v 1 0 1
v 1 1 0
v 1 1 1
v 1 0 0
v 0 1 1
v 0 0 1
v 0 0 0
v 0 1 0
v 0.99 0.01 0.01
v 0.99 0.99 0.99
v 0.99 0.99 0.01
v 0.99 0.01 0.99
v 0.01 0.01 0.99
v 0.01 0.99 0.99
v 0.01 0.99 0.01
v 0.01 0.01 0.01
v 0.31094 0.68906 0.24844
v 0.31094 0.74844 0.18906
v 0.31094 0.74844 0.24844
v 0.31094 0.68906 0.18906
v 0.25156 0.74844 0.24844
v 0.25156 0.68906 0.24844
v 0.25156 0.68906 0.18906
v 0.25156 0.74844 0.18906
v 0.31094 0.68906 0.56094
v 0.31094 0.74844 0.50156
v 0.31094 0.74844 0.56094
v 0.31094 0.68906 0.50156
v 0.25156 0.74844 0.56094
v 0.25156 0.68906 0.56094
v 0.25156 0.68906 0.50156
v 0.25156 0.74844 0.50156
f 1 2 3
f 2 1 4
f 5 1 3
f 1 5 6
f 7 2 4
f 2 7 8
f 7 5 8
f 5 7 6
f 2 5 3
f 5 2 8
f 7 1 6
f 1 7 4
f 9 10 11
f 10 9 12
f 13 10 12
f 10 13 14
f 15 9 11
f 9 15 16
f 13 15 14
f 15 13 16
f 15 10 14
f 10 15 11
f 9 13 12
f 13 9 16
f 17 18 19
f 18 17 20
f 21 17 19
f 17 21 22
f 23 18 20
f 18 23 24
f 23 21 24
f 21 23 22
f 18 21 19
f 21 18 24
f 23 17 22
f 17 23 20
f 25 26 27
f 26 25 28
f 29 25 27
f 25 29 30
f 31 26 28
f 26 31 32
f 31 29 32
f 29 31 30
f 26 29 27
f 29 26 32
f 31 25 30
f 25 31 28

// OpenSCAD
translate([0.28125, 0.71875, 0.21875]) color([0.10508483143425873, 0.881966478034656, 0.07301888341382179]) cube([0.059375, 0.059375, 0.059375], center=true);
translate([0.28125, 0.71875, 0.53125]) color([0.17753722855885679, 0.4372766700204965, 0.6819053320350343]) cube([0.059375, 0.059375, 0.059375], center=true);
color([0.3,0.3,0.3,0.3]) difference() { cube([1,1,1]); translate([0.01,0.01,0.01]) cube([0.98,0.98,0.98]); }
